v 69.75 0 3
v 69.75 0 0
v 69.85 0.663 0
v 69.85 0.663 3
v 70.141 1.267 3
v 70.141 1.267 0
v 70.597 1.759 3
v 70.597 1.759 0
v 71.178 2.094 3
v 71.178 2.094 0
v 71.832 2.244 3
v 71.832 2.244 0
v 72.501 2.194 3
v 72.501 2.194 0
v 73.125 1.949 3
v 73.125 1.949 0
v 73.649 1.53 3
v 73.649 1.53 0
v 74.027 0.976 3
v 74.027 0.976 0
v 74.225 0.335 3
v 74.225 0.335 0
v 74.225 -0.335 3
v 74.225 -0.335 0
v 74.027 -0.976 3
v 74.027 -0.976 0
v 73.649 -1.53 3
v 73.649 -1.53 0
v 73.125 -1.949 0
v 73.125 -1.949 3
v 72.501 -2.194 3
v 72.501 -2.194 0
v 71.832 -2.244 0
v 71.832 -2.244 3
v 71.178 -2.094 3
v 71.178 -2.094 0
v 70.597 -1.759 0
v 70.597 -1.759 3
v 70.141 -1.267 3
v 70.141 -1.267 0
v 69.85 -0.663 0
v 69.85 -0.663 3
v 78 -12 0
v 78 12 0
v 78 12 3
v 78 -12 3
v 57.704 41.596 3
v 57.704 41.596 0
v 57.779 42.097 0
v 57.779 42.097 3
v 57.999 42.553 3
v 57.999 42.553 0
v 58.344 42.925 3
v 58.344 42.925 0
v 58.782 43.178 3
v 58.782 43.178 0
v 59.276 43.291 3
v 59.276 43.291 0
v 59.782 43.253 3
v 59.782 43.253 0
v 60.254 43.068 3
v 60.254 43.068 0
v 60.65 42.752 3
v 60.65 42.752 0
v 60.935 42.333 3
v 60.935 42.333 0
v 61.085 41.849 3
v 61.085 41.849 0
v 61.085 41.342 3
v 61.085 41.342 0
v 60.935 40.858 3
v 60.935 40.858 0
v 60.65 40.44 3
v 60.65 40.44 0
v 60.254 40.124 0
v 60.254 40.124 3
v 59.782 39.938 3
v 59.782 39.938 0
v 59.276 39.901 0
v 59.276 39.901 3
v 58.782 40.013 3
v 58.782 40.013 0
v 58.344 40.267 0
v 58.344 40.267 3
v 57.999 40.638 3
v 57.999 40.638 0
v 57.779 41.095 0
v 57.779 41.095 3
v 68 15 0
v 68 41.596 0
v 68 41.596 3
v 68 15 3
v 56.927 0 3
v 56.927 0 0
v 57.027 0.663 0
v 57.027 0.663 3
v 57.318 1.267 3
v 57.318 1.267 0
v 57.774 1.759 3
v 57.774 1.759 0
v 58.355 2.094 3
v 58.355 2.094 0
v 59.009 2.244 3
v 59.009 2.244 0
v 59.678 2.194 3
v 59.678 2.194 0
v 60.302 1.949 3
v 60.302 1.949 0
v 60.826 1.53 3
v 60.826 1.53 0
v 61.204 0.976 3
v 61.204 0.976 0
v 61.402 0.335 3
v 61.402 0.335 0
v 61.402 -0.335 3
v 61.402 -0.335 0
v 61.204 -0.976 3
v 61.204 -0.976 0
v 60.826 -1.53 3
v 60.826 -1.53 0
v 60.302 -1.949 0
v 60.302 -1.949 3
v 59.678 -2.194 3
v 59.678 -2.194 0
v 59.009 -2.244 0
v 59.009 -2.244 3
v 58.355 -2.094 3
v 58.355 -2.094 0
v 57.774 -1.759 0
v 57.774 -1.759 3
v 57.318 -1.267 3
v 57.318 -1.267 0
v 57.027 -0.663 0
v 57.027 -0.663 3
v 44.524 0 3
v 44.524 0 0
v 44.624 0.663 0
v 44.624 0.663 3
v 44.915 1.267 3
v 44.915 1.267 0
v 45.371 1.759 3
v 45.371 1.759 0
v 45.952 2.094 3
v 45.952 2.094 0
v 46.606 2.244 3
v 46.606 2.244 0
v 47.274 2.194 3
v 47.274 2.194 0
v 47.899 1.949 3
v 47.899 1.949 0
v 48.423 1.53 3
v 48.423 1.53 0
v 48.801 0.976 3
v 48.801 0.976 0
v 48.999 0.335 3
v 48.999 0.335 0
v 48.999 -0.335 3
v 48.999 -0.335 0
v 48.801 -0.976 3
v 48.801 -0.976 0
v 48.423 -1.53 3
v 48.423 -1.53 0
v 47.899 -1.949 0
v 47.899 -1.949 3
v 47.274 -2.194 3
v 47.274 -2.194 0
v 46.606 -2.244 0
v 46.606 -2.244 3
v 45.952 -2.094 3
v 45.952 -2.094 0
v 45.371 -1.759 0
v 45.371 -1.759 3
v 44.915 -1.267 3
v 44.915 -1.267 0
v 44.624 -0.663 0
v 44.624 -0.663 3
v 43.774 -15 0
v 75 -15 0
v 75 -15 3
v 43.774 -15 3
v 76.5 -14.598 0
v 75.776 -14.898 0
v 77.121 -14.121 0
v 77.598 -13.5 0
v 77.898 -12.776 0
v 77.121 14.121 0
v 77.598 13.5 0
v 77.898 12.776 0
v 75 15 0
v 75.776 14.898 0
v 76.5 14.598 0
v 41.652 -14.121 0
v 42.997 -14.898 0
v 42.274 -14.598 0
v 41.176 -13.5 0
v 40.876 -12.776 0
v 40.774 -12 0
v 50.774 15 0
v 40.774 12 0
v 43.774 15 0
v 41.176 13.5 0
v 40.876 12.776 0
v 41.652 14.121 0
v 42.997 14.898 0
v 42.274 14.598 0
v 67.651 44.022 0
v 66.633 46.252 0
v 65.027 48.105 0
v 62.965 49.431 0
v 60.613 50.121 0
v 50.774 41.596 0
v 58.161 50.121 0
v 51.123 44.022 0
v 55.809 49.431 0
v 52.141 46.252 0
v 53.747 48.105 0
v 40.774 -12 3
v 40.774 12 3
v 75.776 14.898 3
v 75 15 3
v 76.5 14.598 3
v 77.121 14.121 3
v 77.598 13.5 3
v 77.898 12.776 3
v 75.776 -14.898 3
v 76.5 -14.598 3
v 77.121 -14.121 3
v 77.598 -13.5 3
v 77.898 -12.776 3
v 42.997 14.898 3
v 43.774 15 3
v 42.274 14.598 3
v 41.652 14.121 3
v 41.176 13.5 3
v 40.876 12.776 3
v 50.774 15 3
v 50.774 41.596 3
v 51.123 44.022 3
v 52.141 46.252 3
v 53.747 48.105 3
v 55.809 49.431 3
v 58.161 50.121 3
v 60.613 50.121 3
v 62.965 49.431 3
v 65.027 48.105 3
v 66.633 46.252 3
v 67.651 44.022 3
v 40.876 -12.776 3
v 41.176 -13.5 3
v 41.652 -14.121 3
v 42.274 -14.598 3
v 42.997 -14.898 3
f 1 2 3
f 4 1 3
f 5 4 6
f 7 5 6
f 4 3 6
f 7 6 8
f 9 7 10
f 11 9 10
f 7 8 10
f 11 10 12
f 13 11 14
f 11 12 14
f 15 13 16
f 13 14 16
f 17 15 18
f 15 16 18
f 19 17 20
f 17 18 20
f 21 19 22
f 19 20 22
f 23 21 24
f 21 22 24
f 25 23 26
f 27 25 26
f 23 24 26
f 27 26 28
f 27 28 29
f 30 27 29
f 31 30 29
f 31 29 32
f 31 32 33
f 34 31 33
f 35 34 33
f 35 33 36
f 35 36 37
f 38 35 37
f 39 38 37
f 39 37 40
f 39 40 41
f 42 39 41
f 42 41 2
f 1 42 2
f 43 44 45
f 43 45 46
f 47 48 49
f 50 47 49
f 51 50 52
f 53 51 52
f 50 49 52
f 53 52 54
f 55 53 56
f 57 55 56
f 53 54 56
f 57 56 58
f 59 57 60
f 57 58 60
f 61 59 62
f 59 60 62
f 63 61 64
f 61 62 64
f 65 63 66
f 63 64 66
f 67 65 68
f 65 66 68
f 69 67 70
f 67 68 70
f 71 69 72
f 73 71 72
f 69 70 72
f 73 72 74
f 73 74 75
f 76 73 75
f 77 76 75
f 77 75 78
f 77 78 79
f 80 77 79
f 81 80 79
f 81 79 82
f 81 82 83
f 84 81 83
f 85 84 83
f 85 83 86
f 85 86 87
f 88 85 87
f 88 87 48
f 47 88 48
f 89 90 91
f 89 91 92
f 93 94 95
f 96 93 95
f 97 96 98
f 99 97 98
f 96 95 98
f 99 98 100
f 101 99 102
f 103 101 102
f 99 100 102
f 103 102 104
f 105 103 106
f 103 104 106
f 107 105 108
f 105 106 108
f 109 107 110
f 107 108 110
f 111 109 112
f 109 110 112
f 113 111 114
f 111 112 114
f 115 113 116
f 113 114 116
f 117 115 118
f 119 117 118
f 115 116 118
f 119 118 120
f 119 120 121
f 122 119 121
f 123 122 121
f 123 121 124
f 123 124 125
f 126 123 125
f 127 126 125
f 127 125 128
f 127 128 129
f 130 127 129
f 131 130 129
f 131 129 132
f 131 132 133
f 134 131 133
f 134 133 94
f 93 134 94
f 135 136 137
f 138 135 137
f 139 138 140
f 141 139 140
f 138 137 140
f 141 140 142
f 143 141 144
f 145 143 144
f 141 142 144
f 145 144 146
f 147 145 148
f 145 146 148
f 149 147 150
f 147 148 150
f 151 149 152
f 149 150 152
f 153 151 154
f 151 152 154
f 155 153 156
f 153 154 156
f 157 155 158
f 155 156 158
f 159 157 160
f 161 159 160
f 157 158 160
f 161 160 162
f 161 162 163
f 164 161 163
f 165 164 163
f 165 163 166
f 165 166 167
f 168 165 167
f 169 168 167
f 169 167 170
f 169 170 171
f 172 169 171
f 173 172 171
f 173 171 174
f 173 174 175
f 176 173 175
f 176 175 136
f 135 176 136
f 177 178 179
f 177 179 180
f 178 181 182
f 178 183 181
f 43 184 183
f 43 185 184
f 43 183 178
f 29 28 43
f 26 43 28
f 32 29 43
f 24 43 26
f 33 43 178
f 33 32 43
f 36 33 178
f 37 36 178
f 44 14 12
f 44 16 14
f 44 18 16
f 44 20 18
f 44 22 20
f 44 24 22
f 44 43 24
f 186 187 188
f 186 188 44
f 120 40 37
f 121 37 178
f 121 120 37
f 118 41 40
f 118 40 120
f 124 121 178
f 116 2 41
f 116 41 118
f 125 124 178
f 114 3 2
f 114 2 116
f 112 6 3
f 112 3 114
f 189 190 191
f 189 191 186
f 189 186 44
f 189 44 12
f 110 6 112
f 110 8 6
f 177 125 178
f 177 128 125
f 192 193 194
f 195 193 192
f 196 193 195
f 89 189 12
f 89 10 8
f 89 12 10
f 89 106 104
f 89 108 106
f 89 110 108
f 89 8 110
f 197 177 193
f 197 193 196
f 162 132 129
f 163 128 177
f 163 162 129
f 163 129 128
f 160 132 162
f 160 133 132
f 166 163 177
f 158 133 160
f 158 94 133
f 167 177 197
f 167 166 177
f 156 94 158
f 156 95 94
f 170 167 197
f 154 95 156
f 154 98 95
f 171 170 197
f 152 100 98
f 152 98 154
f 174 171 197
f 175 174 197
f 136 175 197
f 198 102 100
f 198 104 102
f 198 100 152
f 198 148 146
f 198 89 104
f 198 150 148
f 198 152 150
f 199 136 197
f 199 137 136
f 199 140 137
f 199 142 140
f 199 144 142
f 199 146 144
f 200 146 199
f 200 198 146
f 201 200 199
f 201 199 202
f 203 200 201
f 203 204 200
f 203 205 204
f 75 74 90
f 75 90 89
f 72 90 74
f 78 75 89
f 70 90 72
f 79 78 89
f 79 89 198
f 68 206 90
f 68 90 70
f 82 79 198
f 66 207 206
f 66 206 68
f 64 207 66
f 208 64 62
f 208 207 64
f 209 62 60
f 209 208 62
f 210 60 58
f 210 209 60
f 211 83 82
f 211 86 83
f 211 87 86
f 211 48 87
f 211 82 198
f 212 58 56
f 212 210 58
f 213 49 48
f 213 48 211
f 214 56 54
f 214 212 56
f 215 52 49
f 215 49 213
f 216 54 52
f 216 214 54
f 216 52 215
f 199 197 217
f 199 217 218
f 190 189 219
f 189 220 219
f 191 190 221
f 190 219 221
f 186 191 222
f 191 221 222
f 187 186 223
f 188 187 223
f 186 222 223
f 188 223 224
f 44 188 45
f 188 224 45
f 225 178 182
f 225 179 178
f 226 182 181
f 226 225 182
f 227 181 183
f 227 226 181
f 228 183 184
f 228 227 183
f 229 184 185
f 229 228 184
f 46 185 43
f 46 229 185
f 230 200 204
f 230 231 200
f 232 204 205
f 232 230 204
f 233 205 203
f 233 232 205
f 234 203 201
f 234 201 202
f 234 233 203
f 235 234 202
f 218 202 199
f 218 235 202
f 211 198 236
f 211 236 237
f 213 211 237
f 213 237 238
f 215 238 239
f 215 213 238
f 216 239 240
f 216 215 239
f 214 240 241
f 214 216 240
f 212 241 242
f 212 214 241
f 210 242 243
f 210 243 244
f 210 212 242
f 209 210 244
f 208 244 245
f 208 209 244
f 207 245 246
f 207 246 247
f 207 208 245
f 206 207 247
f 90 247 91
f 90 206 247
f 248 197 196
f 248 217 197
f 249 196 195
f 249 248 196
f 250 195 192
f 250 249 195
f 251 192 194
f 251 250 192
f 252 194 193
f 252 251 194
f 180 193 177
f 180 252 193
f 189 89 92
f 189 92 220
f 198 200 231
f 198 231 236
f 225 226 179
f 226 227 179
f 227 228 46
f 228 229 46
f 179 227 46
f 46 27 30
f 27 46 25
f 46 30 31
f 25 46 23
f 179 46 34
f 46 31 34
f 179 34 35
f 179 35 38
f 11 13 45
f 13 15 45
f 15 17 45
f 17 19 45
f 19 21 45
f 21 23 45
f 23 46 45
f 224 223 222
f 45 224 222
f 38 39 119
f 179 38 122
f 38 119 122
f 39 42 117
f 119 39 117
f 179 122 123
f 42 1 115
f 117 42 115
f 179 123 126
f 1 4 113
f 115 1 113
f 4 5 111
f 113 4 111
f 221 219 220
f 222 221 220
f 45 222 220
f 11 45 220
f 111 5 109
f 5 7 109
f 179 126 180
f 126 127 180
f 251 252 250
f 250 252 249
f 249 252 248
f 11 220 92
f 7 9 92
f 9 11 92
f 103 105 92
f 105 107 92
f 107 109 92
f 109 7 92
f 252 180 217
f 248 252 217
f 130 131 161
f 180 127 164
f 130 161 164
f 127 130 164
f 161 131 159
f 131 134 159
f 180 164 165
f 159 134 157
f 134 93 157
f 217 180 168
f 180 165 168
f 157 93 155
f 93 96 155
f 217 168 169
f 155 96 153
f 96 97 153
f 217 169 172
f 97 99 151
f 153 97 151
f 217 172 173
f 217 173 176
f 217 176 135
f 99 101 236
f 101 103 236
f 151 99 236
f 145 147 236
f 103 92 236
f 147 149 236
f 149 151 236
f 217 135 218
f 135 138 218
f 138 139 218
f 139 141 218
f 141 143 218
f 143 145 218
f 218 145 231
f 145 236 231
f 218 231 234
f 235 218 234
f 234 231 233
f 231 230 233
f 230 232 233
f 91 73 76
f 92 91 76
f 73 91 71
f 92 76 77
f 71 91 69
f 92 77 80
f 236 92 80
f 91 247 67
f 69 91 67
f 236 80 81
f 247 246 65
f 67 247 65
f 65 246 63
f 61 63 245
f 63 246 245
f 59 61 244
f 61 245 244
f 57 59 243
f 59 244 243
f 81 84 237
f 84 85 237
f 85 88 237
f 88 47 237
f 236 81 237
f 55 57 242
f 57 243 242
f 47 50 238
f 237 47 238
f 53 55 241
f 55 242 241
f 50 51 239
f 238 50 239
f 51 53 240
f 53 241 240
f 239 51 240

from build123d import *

# Parameters (mm, degrees)
BOSS_EXTRUDE1_DEPTH  = 3
M3_CLEARANCE_HOLE1_D = 3.4
M4_CLEARANCE_HOLE1_D = 4.5
FILLET1_R            = 3


with BuildPart() as part:
    # Sketch1 → Boss-Extrude1 (new body)
    with BuildSketch(Plane.XY):
        with BuildLine():
            Line((50.773782993, 15), (50.773782993, 41.5958))
            ThreePointArc((50.773782993, 41.5958), (59.386891497, 50.208908503), (68, 41.5958))
            Line((68, 41.5958), (68, 15))
            Line((68, 15), (78, 15))
            Line((78, 15), (78, -15))
            Line((78, -15), (40.773782993, -15))
            Line((40.773782993, -15), (40.773782993, 15))
            Line((40.773782993, 15), (50.773782993, 15))
        make_face()
    extrude(amount=BOSS_EXTRUDE1_DEPTH)

    # M3 Clearance Hole1 (through all)
    with Locations(Plane.XY.offset(3)):
        with Locations((59.40350934, 41.5958)):
            Hole(M3_CLEARANCE_HOLE1_D / 2)

    # M4 Clearance Hole1 (through all)
    with Locations(Plane.XY.offset(3)):
        with Locations((46.773782993, 0), (72, 0), (59.177120078, 0)):
            Hole(M4_CLEARANCE_HOLE1_D / 2)

    # Fillet1
    fillet1_edges = [part.edges().sort_by_distance(p)[0] for p in [
        (78, -15, 1.5),
        (40.773782993, -15, 1.5),
        (40.773782993, 15, 1.5),
        (78, 15, 1.5),
    ]]
    fillet(fillet1_edges, radius=FILLET1_R)


solid = part.part
